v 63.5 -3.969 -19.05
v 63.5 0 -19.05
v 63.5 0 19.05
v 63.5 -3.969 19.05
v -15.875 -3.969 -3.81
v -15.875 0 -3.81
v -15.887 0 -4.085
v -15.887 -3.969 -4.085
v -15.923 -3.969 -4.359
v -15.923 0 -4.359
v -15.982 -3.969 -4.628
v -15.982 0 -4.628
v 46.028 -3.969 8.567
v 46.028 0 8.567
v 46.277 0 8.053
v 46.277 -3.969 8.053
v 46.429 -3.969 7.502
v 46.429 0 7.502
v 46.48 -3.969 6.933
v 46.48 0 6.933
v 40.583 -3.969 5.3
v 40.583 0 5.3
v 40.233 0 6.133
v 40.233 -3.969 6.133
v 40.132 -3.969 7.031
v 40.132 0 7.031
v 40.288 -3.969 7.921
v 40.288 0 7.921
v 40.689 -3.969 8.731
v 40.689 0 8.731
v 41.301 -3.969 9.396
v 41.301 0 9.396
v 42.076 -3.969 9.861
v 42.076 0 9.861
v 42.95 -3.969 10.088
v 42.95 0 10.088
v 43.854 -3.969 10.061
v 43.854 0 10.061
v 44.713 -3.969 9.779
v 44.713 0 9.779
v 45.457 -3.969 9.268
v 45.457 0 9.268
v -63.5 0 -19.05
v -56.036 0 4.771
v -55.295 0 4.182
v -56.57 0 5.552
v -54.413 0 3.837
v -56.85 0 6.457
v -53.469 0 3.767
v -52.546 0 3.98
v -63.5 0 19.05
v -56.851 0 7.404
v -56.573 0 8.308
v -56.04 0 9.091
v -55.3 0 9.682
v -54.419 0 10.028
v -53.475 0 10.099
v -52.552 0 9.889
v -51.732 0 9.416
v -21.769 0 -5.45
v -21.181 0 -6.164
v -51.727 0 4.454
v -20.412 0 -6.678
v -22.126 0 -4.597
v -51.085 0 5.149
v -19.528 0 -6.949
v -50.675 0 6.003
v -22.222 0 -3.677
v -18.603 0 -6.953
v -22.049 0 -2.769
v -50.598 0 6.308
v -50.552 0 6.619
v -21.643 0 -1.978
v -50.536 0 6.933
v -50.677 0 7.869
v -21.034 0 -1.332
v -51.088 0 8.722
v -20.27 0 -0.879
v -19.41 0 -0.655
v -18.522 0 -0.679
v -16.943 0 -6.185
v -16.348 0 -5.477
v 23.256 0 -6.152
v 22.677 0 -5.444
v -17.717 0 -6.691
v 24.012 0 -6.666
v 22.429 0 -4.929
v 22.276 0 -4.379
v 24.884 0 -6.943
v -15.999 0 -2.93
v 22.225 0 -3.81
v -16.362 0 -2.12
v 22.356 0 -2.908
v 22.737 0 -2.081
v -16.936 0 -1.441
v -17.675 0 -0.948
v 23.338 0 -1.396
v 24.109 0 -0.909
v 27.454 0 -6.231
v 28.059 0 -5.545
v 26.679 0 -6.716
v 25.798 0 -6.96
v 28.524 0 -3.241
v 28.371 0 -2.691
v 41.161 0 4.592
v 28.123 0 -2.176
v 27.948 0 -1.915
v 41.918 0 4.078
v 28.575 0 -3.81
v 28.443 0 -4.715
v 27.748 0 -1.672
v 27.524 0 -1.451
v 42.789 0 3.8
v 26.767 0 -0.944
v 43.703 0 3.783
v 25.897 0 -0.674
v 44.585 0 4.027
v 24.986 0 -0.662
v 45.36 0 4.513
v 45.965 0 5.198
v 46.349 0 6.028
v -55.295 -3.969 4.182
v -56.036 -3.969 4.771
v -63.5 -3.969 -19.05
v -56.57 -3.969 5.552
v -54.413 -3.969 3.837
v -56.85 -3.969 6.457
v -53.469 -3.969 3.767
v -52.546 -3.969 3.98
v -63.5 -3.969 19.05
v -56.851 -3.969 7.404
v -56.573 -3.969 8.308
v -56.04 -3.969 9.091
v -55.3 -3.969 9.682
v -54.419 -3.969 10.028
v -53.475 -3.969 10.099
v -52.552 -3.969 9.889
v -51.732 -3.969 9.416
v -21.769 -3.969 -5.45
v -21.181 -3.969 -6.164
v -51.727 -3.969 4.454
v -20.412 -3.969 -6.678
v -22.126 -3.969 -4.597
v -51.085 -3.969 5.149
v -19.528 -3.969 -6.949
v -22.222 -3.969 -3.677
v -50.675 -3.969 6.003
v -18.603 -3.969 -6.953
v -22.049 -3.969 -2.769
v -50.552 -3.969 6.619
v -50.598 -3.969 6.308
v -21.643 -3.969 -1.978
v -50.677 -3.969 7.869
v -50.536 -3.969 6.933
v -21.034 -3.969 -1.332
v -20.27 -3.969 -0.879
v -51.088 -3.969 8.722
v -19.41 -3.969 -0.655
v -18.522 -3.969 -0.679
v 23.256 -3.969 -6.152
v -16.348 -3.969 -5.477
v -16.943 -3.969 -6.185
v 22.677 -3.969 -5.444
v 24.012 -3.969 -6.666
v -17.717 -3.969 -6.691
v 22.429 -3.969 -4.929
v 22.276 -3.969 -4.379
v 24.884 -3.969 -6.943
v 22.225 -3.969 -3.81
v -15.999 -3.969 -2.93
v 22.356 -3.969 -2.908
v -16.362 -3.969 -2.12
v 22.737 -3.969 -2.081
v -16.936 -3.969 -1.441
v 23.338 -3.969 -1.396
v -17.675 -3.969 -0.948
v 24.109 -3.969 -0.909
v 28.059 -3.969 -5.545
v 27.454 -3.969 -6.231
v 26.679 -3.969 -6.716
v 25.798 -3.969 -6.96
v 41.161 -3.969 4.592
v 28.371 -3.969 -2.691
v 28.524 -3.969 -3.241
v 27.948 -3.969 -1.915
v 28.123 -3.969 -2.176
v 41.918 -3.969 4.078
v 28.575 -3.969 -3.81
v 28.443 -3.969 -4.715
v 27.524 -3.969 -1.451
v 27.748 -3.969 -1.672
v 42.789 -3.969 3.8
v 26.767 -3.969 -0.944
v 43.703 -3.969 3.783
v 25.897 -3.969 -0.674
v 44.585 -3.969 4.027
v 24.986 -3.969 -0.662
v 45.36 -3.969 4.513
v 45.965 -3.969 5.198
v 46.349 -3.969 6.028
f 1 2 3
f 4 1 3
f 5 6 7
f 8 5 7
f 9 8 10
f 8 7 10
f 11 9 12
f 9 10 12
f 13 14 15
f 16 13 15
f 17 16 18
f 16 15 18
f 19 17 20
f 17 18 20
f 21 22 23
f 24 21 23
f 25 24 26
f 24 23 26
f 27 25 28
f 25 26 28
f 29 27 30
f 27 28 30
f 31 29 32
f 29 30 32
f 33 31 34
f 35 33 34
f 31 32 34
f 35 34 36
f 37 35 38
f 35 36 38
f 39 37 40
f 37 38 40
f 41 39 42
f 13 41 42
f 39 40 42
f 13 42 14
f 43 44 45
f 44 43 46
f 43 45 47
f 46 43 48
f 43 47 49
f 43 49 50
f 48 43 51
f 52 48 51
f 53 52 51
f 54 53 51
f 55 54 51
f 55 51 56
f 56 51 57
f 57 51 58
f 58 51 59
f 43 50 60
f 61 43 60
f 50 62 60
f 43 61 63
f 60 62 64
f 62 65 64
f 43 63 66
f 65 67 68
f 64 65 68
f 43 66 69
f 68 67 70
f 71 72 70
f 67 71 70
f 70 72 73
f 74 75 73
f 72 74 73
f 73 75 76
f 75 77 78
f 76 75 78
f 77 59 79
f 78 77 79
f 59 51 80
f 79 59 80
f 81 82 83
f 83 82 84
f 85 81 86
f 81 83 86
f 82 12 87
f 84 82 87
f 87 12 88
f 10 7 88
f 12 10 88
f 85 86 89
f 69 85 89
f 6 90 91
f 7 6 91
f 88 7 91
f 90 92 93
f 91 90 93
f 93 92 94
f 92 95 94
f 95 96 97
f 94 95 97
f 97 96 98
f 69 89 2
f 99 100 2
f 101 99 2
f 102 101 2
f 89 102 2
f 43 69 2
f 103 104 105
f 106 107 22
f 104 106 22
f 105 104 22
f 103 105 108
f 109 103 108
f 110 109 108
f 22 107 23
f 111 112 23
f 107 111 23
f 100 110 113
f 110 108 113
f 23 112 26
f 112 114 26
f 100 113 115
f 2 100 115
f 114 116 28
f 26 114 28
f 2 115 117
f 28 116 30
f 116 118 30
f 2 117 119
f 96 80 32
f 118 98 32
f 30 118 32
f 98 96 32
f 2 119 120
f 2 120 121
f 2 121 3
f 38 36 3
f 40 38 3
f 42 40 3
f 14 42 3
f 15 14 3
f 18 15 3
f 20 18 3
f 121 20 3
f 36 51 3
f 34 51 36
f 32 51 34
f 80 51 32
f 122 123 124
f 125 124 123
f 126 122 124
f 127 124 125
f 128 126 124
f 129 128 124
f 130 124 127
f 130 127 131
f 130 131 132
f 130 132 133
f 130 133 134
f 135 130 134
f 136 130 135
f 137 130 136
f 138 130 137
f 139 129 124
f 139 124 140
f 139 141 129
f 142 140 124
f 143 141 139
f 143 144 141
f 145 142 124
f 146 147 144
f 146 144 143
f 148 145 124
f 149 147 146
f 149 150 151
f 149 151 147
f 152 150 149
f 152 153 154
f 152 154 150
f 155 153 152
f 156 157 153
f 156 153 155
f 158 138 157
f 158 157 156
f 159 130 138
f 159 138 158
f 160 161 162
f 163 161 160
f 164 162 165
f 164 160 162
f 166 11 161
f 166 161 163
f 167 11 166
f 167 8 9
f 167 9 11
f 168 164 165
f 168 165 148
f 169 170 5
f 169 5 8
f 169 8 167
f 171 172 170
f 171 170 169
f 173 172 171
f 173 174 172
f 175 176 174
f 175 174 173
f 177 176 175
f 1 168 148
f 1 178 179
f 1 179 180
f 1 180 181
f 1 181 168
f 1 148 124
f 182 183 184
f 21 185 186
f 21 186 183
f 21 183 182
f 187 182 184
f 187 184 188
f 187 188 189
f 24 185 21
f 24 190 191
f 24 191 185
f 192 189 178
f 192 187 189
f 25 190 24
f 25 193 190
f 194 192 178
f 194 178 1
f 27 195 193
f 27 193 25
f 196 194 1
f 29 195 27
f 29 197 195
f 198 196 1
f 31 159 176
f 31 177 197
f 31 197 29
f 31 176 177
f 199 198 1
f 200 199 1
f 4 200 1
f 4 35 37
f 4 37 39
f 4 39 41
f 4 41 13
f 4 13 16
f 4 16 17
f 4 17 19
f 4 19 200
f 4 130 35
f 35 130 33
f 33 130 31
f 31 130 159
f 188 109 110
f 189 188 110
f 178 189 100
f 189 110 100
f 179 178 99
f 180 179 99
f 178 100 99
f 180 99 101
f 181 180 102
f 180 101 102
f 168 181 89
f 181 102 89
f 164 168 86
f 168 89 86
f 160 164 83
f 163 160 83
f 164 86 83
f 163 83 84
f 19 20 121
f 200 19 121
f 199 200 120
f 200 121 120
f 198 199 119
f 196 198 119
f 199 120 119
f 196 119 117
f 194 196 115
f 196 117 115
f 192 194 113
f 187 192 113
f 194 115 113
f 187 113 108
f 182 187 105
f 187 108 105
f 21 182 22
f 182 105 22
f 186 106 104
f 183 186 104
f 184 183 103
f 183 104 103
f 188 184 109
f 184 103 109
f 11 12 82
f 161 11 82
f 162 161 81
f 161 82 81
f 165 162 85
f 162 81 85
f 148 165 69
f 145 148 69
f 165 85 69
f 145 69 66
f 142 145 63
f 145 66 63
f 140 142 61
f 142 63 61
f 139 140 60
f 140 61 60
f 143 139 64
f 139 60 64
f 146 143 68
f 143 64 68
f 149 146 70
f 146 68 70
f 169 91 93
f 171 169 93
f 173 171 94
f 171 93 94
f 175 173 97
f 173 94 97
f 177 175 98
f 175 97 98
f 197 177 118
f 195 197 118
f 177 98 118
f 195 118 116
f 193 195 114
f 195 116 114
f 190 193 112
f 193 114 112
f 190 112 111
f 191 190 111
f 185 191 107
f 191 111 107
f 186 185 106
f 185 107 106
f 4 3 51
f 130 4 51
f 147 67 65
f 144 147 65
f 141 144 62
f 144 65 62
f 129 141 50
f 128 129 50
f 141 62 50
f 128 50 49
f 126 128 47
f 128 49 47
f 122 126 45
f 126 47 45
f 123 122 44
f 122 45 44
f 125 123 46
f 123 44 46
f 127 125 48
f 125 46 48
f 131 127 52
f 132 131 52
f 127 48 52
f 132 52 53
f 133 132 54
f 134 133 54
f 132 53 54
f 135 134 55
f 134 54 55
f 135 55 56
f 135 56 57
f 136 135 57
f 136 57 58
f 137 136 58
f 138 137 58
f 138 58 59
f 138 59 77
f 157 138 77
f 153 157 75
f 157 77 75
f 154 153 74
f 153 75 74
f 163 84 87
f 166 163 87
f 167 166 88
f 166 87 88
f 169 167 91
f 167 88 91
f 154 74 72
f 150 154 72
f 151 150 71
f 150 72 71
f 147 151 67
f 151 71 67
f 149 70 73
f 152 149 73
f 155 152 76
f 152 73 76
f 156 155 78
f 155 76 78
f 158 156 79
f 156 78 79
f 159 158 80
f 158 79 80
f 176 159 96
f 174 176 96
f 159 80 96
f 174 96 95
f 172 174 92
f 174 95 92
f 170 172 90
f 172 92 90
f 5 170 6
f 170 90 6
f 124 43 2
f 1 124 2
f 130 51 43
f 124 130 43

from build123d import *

# Parameters (mm, degrees)
F1_DEPTH = 3.96875


with BuildPart() as f1:
    # F0 (on Front) → F1 (new body)
    with BuildSketch(Plane.XZ):
        with BuildLine():
            Line((46.0279571805, 8.5667743083), (63.5, 19.05))
            Line((63.5, 19.05), (45.9832364526, 19.05))
            Line((45.9832364526, 19.05), (27.5244896752, -1.4505151791))
            ThreePointArc((27.5244896752, -1.4505151791), (27.8505466804, -1.7912266182), (28.1225400391, -2.1764759765))
            Line((28.1225400391, -2.1764759765), (40.5828771022, 5.2997262613))
            ThreePointArc((40.5828771022, 5.2997262613), (41.6718931179, 9.6557903239), (46.0279571805, 8.5667743083))
        make_face()
        with BuildLine():
            Line((27.5244896752, -1.4505151791), (45.9832364526, 19.05))
            Line((45.9832364526, 19.05), (-63.5, 19.05))
            Line((-63.5, 19.05), (-63.5, -19.05))
            Line((-63.5, -19.05), (0, -19.05))
            Line((0, -19.05), (0, -9.525))
            Line((0, -9.525), (-15.9821089289, -4.6277220653))
            ThreePointArc((-15.9821089289, -4.6277220653), (-19.9802006219, -6.8456797926), (-22.0493462104, -2.7685839881))
            ThreePointArc((-22.0493462104, -2.7685839881), (-18.5219371336, -0.6792214053), (-15.875, -3.81))
            Line((-15.875, -3.81), (0, -3.81))
            Line((0, -3.81), (22.225, -3.81))
            ThreePointArc((22.225, -3.81), (24.1086111582, -0.909493172), (27.5244896752, -1.4505151791))
        make_face()
        with BuildLine():
            ThreePointArc((-50.535970122, 6.9332502848), (-50.5709933433, 6.4629622568), (-50.6752903294, 6.0030496629))
            ThreePointArc((-50.6752903294, 6.0030496629), (-56.8509469007, 7.4035383128), (-50.535970122, 6.9332502848))
        make_face(mode=Mode.SUBTRACT)
        with BuildLine():
            Line((63.5, -19.05), (63.5, 19.05))
            Line((63.5, 19.05), (46.0279571805, 8.5667743083))
            ThreePointArc((46.0279571805, 8.5667743083), (46.3652120384, 7.7807644073), (46.4804171413, 6.9332502848))
            ThreePointArc((46.4804171413, 6.9332502848), (44.1529312639, 3.8734553877), (40.5828771022, 5.2997262613))
            Line((40.5828771022, 5.2997262613), (28.1225400391, -2.1764759765))
            ThreePointArc((28.1225400391, -2.1764759765), (28.4597948971, -2.9624858775), (28.575, -3.81))
            ThreePointArc((28.575, -3.81), (26.2475141225, -6.8697948971), (22.6774599609, -5.4435240235))
            Line((22.6774599609, -5.4435240235), (10.5083445014, -12.7449932991))
            Line((10.5083445014, -12.7449932991), (0, -19.05))
            Line((0, -19.05), (63.5, -19.05))
        make_face()
        Polygon((0, -9.525), (0, -19.05), (10.5083445014, -12.7449932991), align=None)
        with BuildLine():
            ThreePointArc((22.6774599609, -5.4435240235), (22.3402051029, -4.6575141225), (22.225, -3.81))
            Line((22.225, -3.81), (0, -3.81))
            Line((0, -3.81), (-15.875, -3.81))
            ThreePointArc((-15.875, -3.81), (-15.9018911113, -4.222353519), (-15.9821089289, -4.6277220653))
            Line((-15.9821089289, -4.6277220653), (0, -9.525))
            Line((0, -9.525), (10.5083445014, -12.7449932991))
            Line((10.5083445014, -12.7449932991), (22.6774599609, -5.4435240235))
        make_face()
    extrude(amount=F1_DEPTH)


solid = f1.part
